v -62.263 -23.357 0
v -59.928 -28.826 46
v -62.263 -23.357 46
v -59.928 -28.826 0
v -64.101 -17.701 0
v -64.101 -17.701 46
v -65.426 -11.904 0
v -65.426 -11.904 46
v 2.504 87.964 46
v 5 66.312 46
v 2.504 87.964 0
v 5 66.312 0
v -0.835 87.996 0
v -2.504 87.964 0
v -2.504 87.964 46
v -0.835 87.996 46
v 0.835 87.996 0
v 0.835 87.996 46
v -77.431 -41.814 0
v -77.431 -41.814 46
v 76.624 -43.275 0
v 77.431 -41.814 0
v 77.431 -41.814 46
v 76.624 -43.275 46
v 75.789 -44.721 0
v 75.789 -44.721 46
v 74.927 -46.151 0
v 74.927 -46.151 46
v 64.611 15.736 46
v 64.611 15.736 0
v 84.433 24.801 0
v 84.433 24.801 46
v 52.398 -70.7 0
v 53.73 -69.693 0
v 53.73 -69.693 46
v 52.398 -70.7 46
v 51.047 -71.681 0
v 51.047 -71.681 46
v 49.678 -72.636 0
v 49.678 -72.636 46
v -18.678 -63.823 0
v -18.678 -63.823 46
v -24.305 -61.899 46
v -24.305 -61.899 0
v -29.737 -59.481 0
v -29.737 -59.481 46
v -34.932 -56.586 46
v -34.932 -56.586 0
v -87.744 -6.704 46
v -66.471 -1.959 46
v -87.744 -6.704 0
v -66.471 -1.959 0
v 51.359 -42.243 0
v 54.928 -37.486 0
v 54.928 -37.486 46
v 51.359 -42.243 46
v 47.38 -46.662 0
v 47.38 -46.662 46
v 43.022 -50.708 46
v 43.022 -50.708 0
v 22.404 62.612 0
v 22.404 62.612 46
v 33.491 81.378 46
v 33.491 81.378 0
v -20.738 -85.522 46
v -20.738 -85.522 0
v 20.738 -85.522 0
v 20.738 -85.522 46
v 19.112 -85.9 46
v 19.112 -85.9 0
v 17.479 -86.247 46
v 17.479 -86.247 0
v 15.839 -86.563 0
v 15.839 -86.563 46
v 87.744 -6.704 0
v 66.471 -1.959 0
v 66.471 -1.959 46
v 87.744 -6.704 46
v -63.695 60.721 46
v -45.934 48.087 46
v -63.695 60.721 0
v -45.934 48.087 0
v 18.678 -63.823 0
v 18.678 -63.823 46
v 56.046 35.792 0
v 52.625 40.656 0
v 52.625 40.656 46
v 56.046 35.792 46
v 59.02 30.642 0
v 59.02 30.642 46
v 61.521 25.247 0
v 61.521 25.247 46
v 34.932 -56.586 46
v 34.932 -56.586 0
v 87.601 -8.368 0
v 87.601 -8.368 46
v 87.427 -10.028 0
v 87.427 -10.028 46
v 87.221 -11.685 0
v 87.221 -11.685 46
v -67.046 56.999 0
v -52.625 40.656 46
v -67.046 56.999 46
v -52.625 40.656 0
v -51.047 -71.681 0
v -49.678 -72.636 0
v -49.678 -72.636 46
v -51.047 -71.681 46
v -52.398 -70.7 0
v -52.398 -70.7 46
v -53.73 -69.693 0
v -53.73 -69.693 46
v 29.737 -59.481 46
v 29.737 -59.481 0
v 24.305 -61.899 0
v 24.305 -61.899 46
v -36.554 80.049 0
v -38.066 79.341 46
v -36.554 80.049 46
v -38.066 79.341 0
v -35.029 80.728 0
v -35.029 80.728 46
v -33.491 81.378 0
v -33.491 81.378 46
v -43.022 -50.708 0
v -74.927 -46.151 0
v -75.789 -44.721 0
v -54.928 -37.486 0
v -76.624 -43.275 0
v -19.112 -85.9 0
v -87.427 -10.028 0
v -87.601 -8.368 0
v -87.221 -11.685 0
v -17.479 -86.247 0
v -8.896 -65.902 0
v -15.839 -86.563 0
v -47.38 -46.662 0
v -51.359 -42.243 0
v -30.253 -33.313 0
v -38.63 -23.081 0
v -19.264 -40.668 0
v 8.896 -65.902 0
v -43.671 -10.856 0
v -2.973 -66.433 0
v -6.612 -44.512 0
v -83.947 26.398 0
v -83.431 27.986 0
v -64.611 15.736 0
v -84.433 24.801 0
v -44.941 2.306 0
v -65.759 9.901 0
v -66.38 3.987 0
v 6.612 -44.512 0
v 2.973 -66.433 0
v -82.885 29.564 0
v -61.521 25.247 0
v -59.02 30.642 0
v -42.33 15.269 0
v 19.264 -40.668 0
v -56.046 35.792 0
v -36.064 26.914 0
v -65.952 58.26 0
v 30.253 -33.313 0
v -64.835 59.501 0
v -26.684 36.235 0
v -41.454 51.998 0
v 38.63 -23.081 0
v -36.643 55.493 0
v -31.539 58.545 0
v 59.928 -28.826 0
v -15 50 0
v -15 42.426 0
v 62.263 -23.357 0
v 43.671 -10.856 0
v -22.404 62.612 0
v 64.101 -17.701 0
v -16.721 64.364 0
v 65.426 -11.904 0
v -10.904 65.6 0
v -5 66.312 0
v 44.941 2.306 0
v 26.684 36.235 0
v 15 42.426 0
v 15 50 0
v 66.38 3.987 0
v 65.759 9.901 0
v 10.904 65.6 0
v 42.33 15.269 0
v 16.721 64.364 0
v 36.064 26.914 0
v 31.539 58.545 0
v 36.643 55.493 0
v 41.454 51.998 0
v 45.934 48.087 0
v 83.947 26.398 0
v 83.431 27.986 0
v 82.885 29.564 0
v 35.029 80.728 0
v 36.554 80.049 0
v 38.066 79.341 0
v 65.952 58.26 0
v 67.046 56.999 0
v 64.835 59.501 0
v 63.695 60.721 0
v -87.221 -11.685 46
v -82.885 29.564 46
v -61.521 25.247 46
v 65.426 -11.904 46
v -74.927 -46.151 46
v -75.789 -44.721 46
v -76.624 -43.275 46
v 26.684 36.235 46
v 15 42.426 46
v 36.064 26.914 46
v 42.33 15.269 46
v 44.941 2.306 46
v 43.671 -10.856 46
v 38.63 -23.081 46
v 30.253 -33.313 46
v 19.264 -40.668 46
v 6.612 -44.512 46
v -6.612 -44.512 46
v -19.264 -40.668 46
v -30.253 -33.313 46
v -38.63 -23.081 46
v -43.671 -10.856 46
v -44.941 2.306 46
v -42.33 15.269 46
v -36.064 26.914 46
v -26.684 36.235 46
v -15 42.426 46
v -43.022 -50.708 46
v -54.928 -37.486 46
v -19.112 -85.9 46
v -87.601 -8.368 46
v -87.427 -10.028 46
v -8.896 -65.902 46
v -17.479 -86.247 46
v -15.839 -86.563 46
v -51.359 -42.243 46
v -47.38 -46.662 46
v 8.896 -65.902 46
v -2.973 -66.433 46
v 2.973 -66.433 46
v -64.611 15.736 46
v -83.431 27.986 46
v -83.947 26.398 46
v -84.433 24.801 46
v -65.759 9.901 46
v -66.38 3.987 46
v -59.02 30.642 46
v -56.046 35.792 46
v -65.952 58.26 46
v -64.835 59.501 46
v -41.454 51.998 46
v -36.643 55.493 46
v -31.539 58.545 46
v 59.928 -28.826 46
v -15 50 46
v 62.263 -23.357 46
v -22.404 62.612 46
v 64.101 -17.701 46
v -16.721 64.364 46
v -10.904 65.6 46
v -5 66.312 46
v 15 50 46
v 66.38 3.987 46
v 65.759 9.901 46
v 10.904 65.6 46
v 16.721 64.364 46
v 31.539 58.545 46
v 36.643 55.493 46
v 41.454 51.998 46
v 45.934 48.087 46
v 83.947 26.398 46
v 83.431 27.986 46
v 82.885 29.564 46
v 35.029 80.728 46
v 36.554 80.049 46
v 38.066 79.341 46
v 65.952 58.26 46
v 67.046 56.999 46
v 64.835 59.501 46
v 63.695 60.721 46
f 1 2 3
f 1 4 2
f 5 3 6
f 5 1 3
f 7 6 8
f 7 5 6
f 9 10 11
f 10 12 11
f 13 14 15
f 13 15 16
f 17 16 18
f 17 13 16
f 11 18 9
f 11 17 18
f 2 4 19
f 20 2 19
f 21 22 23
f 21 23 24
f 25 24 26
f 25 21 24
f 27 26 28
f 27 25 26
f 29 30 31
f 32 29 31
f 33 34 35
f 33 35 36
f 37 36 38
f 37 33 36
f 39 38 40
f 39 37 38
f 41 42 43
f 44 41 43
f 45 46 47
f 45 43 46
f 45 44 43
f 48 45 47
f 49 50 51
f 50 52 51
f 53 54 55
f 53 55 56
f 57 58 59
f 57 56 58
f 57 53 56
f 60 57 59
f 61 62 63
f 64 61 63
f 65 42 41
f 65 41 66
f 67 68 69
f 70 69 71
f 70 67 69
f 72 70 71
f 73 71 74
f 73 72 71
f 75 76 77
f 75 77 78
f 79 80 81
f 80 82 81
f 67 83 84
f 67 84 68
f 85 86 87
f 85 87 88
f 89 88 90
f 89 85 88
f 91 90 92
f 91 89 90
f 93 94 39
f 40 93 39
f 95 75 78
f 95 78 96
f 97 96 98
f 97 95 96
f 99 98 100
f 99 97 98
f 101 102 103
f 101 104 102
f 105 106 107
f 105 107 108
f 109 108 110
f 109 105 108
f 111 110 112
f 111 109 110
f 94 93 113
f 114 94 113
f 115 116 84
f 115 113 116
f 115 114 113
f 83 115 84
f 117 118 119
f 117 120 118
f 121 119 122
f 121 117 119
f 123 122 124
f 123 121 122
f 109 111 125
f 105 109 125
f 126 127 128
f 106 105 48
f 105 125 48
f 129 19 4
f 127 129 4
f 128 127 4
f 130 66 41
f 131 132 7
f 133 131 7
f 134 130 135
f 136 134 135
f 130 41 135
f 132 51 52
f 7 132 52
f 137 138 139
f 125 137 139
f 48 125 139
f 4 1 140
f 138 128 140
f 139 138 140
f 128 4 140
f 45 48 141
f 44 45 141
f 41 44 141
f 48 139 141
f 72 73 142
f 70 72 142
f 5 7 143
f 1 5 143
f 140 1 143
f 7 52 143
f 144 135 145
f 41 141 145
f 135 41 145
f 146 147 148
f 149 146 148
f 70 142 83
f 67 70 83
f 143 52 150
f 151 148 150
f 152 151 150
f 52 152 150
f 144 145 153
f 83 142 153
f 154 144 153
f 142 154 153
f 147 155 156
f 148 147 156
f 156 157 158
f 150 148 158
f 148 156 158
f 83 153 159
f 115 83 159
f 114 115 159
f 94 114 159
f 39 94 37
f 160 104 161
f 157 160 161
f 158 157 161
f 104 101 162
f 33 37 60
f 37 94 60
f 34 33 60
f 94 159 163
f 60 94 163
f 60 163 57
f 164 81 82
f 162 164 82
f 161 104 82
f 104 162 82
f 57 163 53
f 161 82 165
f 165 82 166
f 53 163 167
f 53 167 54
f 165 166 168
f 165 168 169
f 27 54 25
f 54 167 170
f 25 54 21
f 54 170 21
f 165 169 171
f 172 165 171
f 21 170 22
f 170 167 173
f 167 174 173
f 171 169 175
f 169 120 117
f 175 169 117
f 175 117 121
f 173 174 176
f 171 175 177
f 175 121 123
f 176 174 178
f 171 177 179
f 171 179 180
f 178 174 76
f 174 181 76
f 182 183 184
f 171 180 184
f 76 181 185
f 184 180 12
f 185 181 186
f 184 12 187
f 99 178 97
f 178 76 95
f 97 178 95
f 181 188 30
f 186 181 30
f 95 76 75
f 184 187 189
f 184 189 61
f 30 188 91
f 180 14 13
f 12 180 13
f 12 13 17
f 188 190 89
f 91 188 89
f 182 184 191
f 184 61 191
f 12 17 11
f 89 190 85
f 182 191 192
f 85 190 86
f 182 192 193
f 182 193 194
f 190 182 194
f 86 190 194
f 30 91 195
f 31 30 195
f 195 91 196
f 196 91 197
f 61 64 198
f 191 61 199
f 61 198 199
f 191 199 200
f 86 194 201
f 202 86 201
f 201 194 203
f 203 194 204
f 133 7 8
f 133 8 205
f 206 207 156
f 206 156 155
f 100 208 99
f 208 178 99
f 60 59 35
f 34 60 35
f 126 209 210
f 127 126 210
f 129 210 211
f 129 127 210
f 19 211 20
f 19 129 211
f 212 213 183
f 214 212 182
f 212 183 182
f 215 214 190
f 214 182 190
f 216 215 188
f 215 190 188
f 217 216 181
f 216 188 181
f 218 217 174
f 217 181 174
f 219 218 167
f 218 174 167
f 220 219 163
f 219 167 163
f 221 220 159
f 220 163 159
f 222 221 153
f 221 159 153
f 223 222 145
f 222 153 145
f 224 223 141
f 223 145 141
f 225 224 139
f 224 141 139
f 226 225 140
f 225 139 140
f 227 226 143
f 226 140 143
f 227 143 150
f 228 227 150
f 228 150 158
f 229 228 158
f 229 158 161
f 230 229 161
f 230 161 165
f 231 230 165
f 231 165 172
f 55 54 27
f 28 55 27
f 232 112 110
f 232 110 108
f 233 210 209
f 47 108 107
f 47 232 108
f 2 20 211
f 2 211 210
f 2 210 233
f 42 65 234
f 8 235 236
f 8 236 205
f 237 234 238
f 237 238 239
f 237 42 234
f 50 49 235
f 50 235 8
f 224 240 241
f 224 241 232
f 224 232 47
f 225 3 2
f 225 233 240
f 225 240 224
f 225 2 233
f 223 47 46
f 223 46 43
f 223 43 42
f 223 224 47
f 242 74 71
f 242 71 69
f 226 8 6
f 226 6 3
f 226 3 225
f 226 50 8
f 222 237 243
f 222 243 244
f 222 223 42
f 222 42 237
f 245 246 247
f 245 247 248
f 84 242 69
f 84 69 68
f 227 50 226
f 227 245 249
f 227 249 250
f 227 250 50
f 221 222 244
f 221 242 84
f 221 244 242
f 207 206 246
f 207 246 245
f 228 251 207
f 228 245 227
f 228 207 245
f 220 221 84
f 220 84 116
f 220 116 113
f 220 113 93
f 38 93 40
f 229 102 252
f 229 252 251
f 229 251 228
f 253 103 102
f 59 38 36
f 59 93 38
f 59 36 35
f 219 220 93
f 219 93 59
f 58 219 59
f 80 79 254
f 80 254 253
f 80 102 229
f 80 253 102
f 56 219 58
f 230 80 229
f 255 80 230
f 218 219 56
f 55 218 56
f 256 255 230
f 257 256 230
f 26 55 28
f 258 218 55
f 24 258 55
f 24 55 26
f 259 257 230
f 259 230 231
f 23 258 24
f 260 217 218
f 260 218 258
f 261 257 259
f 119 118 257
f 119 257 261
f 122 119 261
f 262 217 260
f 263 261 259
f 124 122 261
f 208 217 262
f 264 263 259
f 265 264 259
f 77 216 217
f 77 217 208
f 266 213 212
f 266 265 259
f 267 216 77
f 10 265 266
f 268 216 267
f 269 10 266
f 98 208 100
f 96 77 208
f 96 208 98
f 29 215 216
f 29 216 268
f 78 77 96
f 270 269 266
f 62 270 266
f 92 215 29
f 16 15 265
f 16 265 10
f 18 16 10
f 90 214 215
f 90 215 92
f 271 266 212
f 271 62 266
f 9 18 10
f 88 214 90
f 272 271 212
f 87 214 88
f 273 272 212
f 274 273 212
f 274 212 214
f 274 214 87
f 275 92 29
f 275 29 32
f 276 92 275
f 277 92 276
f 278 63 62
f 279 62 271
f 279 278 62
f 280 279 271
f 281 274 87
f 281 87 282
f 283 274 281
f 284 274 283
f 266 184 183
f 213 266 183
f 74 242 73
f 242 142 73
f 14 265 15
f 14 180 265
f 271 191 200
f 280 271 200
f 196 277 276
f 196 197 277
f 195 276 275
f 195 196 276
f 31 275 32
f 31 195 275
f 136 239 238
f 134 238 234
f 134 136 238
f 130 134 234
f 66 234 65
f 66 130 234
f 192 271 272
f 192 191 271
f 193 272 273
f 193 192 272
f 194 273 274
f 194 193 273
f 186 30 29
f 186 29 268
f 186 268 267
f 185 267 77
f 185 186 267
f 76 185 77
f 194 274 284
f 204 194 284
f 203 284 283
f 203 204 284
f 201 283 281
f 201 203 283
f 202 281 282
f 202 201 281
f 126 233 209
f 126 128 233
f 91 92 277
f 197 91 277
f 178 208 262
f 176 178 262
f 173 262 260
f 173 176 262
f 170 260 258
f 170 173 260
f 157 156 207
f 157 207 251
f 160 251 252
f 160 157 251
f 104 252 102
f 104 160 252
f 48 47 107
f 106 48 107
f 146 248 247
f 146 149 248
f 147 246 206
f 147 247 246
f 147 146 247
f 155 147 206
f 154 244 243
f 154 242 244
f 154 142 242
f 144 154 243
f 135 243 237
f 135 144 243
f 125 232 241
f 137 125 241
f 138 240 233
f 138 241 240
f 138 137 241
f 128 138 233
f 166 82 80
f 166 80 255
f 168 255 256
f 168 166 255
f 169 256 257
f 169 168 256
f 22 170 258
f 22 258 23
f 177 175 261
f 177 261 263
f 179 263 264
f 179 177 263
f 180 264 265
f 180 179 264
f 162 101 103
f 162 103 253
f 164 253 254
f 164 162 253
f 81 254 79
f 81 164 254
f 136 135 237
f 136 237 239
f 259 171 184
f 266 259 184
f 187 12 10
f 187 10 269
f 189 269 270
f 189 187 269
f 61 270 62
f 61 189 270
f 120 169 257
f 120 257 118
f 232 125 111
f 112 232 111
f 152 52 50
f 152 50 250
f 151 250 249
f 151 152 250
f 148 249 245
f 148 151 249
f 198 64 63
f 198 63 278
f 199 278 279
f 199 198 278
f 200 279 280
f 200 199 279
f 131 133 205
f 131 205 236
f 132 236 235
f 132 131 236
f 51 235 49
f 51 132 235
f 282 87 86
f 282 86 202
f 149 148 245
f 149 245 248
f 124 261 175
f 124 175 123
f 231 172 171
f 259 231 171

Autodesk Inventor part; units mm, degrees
ref_plane "YZ Plane" through (0, 0, 0) normal (1, 0, 0) x (0, 1, 0)
sketch "Sketch1" plane through (0, 0, 0) normal (0, 0, 1) x (1, 0, 0)
  point P0 (0, 0)
sketch "Sketch2" plane through (0, 0, 0) normal (0, 0, 1) x (1, 0, 0)
  circle A0 centre (0, 0) radius 45
  circle A1 centre (0, 0) radius 66.5
  line L0 (-15, 42.4264) -> (-15, 50)
  line L1 (-15, 50) -> (15, 50)
  line L2 (15, 50) -> (15, 42.4264)
  line L3 (5, 88) -> (5, 87.8578)
  line L4 (0, 88) -> (0, 87.8578)
  line L5 (-5, 66.3118) -> (-2.5041, 87.9644)
  line L6 (5, 66.3118) -> (2.5, 88)
  arc A2 (2.5041, 87.9644) -> (-2.5041, 87.9644) centre (0, 0) ccw
  arc A3 (72.6365, 49.6783) -> (72.4155, 50) centre (0, 0) ccw
  arc A4 (84.4329, 24.8009) -> (82.8853, 29.564) centre (0, 0) ccw
  arc A5 (49.6783, -72.6365) -> (53.73, -69.6928) centre (0, 0) ccw
  arc A6 (-53.73, -69.6928) -> (-49.6783, -72.6365) centre (0, 0) ccw
  arc A7 (-82.8853, 29.564) -> (-84.4329, 24.8009) centre (0, 0) ccw
  line L7 (-31.5392, 58.5451) -> (-38.0659, 79.3409)
  line L8 (-22.4037, 62.6125) -> (-33.509, 81.4088)
  arc A8 (-33.4907, 81.378) -> (-38.0659, 79.3409) centre (0, 0) ccw
  line L9 (-52.6249, 40.6555) -> (-67.0458, 56.9987)
  line L10 (-45.9336, 48.087) -> (-63.7239, 60.7414)
  arc A9 (-63.6947, 60.7206) -> (-67.0458, 56.9987) centre (0, 0) ccw
  line L11 (-64.6113, 15.7362) -> (-84.4329, 24.8009)
  line L12 (-61.5211, 25.2467) -> (-82.9204, 29.5711)
  arc A10 (-82.8853, 29.564) -> (-84.4329, 24.8009) centre (0, 0) ccw
  line L13 (-65.4259, -11.9041) -> (-87.2207, -11.6852)
  line L14 (-66.4711, -1.9589) -> (-87.7792, -6.7122)
  arc A11 (-87.7442, -6.7044) -> (-87.2207, -11.6852) centre (0, 0) ccw
  line L15 (-54.9277, -37.486) -> (-74.9273, -46.1508)
  line L16 (-59.9277, -28.8258) -> (-77.4602, -41.8349)
  arc A12 (-77.4314, -41.8136) -> (-74.9273, -46.1508) centre (0, 0) ccw
  line L17 (-34.932, -56.5863) -> (-49.6783, -72.6365)
  line L18 (-43.0222, -50.7084) -> (-53.7476, -69.724)
  arc A13 (-53.73, -69.6928) -> (-49.6783, -72.6365) centre (0, 0) ccw
  line L19 (-8.8963, -65.9023) -> (-15.8394, -86.5628)
  line L20 (-18.6777, -63.8231) -> (-20.7416, -85.5572)
  arc A14 (-20.7382, -85.5215) -> (-15.8394, -86.5628) centre (0, 0) ccw
  line L21 (18.6777, -63.8231) -> (20.7382, -85.5215)
  line L22 (8.8963, -65.9023) -> (15.8509, -86.5968)
  arc A15 (15.8394, -86.5628) -> (20.7382, -85.5215) centre (0, 0) ccw
  line L23 (43.0222, -50.7084) -> (53.73, -69.6928)
  line L24 (34.932, -56.5863) -> (49.7026, -72.663)
  arc A16 (49.6783, -72.6365) -> (53.73, -69.6928) centre (0, 0) ccw
  line L25 (59.9277, -28.8258) -> (77.4314, -41.8136)
  line L26 (54.9277, -37.486) -> (74.9602, -46.1651)
  arc A17 (74.9273, -46.1508) -> (77.4314, -41.8136) centre (0, 0) ccw
  line L27 (66.4711, -1.9589) -> (87.7442, -6.7044)
  line L28 (65.4259, -11.9041) -> (87.2566, -11.6848)
  arc A18 (87.2207, -11.6852) -> (87.7442, -6.7044) centre (0, 0) ccw
  line L29 (61.5211, 25.2467) -> (82.8853, 29.564)
  line L30 (64.6113, 15.7362) -> (84.4655, 24.8159)
  arc A19 (84.4329, 24.8009) -> (82.8853, 29.564) centre (0, 0) ccw
  line L31 (45.9336, 48.087) -> (63.6947, 60.7206)
  line L32 (52.6249, 40.6555) -> (67.0696, 57.0256)
  arc A20 (67.0458, 56.9987) -> (63.6947, 60.7206) centre (0, 0) ccw
  line L33 (22.4037, 62.6125) -> (33.4907, 81.378)
  line L34 (31.5392, 58.5451) -> (38.0767, 79.3752)
  arc A21 (38.0659, 79.3409) -> (33.4907, 81.378) centre (0, 0) ccw
  point P0 (15, 46.2132)
  point P1 (-15, 46.2132)
  point P2 (5, 77.1559)
  point P3 (0, 77.1559)
  point P4 (0, -88)
  point P5 (-82.8853, 29.564)
  point P6 (-84.4329, 24.8009)
  point P7 (-53.73, -69.6928)
  point P8 (-49.6783, -72.6365)
  point P9 (49.6783, -72.6365)
  point P10 (53.73, -69.6928)
  point P11 (82.8853, 29.564)
  dimension "d2" = 90
  dimension "d3" = 21.5
  dimension "d4" = 30
  dimension "d5" = 50
  dimension "d6" = 88
  dimension "d7" = 15
  dimension "d10" = 38
  dimension "d17" = 360
extrude "Extrusion1" add sketch "Sketch2" along normal blind 46 contours A1
ref_plane "Work Plane1" through (0, 0, 23) normal (0, 0, 1) x (1, 0, 0)
ref_plane "Work Plane2" through (0, 0, 23) normal (0, 0, 1) x (1, 0, 0)
extrude "Extrusion2" add sketch "Sketch2" along normal blind 46 contours A1 L29 A4 L30 | L27 A18 L28 A1 | A1 L31 A20 L32 | L25 A17 L26 A1 | A1 L33 A21 L34 | L23 A5 L24 A1 | A1 L5 A2 L6 | L21 A15 L22 A1 | A1 L7 A8 L8 | L19 A14 L20 A1 | A1 L9 A9 L10 | L17 A6 L18 A1 | A1 L11 A7 L12 | L15 A12 L16 A1 | A1 L13 A11 L14
properties part number "Engranaje pequeño" material "Steel, Galvanized"
